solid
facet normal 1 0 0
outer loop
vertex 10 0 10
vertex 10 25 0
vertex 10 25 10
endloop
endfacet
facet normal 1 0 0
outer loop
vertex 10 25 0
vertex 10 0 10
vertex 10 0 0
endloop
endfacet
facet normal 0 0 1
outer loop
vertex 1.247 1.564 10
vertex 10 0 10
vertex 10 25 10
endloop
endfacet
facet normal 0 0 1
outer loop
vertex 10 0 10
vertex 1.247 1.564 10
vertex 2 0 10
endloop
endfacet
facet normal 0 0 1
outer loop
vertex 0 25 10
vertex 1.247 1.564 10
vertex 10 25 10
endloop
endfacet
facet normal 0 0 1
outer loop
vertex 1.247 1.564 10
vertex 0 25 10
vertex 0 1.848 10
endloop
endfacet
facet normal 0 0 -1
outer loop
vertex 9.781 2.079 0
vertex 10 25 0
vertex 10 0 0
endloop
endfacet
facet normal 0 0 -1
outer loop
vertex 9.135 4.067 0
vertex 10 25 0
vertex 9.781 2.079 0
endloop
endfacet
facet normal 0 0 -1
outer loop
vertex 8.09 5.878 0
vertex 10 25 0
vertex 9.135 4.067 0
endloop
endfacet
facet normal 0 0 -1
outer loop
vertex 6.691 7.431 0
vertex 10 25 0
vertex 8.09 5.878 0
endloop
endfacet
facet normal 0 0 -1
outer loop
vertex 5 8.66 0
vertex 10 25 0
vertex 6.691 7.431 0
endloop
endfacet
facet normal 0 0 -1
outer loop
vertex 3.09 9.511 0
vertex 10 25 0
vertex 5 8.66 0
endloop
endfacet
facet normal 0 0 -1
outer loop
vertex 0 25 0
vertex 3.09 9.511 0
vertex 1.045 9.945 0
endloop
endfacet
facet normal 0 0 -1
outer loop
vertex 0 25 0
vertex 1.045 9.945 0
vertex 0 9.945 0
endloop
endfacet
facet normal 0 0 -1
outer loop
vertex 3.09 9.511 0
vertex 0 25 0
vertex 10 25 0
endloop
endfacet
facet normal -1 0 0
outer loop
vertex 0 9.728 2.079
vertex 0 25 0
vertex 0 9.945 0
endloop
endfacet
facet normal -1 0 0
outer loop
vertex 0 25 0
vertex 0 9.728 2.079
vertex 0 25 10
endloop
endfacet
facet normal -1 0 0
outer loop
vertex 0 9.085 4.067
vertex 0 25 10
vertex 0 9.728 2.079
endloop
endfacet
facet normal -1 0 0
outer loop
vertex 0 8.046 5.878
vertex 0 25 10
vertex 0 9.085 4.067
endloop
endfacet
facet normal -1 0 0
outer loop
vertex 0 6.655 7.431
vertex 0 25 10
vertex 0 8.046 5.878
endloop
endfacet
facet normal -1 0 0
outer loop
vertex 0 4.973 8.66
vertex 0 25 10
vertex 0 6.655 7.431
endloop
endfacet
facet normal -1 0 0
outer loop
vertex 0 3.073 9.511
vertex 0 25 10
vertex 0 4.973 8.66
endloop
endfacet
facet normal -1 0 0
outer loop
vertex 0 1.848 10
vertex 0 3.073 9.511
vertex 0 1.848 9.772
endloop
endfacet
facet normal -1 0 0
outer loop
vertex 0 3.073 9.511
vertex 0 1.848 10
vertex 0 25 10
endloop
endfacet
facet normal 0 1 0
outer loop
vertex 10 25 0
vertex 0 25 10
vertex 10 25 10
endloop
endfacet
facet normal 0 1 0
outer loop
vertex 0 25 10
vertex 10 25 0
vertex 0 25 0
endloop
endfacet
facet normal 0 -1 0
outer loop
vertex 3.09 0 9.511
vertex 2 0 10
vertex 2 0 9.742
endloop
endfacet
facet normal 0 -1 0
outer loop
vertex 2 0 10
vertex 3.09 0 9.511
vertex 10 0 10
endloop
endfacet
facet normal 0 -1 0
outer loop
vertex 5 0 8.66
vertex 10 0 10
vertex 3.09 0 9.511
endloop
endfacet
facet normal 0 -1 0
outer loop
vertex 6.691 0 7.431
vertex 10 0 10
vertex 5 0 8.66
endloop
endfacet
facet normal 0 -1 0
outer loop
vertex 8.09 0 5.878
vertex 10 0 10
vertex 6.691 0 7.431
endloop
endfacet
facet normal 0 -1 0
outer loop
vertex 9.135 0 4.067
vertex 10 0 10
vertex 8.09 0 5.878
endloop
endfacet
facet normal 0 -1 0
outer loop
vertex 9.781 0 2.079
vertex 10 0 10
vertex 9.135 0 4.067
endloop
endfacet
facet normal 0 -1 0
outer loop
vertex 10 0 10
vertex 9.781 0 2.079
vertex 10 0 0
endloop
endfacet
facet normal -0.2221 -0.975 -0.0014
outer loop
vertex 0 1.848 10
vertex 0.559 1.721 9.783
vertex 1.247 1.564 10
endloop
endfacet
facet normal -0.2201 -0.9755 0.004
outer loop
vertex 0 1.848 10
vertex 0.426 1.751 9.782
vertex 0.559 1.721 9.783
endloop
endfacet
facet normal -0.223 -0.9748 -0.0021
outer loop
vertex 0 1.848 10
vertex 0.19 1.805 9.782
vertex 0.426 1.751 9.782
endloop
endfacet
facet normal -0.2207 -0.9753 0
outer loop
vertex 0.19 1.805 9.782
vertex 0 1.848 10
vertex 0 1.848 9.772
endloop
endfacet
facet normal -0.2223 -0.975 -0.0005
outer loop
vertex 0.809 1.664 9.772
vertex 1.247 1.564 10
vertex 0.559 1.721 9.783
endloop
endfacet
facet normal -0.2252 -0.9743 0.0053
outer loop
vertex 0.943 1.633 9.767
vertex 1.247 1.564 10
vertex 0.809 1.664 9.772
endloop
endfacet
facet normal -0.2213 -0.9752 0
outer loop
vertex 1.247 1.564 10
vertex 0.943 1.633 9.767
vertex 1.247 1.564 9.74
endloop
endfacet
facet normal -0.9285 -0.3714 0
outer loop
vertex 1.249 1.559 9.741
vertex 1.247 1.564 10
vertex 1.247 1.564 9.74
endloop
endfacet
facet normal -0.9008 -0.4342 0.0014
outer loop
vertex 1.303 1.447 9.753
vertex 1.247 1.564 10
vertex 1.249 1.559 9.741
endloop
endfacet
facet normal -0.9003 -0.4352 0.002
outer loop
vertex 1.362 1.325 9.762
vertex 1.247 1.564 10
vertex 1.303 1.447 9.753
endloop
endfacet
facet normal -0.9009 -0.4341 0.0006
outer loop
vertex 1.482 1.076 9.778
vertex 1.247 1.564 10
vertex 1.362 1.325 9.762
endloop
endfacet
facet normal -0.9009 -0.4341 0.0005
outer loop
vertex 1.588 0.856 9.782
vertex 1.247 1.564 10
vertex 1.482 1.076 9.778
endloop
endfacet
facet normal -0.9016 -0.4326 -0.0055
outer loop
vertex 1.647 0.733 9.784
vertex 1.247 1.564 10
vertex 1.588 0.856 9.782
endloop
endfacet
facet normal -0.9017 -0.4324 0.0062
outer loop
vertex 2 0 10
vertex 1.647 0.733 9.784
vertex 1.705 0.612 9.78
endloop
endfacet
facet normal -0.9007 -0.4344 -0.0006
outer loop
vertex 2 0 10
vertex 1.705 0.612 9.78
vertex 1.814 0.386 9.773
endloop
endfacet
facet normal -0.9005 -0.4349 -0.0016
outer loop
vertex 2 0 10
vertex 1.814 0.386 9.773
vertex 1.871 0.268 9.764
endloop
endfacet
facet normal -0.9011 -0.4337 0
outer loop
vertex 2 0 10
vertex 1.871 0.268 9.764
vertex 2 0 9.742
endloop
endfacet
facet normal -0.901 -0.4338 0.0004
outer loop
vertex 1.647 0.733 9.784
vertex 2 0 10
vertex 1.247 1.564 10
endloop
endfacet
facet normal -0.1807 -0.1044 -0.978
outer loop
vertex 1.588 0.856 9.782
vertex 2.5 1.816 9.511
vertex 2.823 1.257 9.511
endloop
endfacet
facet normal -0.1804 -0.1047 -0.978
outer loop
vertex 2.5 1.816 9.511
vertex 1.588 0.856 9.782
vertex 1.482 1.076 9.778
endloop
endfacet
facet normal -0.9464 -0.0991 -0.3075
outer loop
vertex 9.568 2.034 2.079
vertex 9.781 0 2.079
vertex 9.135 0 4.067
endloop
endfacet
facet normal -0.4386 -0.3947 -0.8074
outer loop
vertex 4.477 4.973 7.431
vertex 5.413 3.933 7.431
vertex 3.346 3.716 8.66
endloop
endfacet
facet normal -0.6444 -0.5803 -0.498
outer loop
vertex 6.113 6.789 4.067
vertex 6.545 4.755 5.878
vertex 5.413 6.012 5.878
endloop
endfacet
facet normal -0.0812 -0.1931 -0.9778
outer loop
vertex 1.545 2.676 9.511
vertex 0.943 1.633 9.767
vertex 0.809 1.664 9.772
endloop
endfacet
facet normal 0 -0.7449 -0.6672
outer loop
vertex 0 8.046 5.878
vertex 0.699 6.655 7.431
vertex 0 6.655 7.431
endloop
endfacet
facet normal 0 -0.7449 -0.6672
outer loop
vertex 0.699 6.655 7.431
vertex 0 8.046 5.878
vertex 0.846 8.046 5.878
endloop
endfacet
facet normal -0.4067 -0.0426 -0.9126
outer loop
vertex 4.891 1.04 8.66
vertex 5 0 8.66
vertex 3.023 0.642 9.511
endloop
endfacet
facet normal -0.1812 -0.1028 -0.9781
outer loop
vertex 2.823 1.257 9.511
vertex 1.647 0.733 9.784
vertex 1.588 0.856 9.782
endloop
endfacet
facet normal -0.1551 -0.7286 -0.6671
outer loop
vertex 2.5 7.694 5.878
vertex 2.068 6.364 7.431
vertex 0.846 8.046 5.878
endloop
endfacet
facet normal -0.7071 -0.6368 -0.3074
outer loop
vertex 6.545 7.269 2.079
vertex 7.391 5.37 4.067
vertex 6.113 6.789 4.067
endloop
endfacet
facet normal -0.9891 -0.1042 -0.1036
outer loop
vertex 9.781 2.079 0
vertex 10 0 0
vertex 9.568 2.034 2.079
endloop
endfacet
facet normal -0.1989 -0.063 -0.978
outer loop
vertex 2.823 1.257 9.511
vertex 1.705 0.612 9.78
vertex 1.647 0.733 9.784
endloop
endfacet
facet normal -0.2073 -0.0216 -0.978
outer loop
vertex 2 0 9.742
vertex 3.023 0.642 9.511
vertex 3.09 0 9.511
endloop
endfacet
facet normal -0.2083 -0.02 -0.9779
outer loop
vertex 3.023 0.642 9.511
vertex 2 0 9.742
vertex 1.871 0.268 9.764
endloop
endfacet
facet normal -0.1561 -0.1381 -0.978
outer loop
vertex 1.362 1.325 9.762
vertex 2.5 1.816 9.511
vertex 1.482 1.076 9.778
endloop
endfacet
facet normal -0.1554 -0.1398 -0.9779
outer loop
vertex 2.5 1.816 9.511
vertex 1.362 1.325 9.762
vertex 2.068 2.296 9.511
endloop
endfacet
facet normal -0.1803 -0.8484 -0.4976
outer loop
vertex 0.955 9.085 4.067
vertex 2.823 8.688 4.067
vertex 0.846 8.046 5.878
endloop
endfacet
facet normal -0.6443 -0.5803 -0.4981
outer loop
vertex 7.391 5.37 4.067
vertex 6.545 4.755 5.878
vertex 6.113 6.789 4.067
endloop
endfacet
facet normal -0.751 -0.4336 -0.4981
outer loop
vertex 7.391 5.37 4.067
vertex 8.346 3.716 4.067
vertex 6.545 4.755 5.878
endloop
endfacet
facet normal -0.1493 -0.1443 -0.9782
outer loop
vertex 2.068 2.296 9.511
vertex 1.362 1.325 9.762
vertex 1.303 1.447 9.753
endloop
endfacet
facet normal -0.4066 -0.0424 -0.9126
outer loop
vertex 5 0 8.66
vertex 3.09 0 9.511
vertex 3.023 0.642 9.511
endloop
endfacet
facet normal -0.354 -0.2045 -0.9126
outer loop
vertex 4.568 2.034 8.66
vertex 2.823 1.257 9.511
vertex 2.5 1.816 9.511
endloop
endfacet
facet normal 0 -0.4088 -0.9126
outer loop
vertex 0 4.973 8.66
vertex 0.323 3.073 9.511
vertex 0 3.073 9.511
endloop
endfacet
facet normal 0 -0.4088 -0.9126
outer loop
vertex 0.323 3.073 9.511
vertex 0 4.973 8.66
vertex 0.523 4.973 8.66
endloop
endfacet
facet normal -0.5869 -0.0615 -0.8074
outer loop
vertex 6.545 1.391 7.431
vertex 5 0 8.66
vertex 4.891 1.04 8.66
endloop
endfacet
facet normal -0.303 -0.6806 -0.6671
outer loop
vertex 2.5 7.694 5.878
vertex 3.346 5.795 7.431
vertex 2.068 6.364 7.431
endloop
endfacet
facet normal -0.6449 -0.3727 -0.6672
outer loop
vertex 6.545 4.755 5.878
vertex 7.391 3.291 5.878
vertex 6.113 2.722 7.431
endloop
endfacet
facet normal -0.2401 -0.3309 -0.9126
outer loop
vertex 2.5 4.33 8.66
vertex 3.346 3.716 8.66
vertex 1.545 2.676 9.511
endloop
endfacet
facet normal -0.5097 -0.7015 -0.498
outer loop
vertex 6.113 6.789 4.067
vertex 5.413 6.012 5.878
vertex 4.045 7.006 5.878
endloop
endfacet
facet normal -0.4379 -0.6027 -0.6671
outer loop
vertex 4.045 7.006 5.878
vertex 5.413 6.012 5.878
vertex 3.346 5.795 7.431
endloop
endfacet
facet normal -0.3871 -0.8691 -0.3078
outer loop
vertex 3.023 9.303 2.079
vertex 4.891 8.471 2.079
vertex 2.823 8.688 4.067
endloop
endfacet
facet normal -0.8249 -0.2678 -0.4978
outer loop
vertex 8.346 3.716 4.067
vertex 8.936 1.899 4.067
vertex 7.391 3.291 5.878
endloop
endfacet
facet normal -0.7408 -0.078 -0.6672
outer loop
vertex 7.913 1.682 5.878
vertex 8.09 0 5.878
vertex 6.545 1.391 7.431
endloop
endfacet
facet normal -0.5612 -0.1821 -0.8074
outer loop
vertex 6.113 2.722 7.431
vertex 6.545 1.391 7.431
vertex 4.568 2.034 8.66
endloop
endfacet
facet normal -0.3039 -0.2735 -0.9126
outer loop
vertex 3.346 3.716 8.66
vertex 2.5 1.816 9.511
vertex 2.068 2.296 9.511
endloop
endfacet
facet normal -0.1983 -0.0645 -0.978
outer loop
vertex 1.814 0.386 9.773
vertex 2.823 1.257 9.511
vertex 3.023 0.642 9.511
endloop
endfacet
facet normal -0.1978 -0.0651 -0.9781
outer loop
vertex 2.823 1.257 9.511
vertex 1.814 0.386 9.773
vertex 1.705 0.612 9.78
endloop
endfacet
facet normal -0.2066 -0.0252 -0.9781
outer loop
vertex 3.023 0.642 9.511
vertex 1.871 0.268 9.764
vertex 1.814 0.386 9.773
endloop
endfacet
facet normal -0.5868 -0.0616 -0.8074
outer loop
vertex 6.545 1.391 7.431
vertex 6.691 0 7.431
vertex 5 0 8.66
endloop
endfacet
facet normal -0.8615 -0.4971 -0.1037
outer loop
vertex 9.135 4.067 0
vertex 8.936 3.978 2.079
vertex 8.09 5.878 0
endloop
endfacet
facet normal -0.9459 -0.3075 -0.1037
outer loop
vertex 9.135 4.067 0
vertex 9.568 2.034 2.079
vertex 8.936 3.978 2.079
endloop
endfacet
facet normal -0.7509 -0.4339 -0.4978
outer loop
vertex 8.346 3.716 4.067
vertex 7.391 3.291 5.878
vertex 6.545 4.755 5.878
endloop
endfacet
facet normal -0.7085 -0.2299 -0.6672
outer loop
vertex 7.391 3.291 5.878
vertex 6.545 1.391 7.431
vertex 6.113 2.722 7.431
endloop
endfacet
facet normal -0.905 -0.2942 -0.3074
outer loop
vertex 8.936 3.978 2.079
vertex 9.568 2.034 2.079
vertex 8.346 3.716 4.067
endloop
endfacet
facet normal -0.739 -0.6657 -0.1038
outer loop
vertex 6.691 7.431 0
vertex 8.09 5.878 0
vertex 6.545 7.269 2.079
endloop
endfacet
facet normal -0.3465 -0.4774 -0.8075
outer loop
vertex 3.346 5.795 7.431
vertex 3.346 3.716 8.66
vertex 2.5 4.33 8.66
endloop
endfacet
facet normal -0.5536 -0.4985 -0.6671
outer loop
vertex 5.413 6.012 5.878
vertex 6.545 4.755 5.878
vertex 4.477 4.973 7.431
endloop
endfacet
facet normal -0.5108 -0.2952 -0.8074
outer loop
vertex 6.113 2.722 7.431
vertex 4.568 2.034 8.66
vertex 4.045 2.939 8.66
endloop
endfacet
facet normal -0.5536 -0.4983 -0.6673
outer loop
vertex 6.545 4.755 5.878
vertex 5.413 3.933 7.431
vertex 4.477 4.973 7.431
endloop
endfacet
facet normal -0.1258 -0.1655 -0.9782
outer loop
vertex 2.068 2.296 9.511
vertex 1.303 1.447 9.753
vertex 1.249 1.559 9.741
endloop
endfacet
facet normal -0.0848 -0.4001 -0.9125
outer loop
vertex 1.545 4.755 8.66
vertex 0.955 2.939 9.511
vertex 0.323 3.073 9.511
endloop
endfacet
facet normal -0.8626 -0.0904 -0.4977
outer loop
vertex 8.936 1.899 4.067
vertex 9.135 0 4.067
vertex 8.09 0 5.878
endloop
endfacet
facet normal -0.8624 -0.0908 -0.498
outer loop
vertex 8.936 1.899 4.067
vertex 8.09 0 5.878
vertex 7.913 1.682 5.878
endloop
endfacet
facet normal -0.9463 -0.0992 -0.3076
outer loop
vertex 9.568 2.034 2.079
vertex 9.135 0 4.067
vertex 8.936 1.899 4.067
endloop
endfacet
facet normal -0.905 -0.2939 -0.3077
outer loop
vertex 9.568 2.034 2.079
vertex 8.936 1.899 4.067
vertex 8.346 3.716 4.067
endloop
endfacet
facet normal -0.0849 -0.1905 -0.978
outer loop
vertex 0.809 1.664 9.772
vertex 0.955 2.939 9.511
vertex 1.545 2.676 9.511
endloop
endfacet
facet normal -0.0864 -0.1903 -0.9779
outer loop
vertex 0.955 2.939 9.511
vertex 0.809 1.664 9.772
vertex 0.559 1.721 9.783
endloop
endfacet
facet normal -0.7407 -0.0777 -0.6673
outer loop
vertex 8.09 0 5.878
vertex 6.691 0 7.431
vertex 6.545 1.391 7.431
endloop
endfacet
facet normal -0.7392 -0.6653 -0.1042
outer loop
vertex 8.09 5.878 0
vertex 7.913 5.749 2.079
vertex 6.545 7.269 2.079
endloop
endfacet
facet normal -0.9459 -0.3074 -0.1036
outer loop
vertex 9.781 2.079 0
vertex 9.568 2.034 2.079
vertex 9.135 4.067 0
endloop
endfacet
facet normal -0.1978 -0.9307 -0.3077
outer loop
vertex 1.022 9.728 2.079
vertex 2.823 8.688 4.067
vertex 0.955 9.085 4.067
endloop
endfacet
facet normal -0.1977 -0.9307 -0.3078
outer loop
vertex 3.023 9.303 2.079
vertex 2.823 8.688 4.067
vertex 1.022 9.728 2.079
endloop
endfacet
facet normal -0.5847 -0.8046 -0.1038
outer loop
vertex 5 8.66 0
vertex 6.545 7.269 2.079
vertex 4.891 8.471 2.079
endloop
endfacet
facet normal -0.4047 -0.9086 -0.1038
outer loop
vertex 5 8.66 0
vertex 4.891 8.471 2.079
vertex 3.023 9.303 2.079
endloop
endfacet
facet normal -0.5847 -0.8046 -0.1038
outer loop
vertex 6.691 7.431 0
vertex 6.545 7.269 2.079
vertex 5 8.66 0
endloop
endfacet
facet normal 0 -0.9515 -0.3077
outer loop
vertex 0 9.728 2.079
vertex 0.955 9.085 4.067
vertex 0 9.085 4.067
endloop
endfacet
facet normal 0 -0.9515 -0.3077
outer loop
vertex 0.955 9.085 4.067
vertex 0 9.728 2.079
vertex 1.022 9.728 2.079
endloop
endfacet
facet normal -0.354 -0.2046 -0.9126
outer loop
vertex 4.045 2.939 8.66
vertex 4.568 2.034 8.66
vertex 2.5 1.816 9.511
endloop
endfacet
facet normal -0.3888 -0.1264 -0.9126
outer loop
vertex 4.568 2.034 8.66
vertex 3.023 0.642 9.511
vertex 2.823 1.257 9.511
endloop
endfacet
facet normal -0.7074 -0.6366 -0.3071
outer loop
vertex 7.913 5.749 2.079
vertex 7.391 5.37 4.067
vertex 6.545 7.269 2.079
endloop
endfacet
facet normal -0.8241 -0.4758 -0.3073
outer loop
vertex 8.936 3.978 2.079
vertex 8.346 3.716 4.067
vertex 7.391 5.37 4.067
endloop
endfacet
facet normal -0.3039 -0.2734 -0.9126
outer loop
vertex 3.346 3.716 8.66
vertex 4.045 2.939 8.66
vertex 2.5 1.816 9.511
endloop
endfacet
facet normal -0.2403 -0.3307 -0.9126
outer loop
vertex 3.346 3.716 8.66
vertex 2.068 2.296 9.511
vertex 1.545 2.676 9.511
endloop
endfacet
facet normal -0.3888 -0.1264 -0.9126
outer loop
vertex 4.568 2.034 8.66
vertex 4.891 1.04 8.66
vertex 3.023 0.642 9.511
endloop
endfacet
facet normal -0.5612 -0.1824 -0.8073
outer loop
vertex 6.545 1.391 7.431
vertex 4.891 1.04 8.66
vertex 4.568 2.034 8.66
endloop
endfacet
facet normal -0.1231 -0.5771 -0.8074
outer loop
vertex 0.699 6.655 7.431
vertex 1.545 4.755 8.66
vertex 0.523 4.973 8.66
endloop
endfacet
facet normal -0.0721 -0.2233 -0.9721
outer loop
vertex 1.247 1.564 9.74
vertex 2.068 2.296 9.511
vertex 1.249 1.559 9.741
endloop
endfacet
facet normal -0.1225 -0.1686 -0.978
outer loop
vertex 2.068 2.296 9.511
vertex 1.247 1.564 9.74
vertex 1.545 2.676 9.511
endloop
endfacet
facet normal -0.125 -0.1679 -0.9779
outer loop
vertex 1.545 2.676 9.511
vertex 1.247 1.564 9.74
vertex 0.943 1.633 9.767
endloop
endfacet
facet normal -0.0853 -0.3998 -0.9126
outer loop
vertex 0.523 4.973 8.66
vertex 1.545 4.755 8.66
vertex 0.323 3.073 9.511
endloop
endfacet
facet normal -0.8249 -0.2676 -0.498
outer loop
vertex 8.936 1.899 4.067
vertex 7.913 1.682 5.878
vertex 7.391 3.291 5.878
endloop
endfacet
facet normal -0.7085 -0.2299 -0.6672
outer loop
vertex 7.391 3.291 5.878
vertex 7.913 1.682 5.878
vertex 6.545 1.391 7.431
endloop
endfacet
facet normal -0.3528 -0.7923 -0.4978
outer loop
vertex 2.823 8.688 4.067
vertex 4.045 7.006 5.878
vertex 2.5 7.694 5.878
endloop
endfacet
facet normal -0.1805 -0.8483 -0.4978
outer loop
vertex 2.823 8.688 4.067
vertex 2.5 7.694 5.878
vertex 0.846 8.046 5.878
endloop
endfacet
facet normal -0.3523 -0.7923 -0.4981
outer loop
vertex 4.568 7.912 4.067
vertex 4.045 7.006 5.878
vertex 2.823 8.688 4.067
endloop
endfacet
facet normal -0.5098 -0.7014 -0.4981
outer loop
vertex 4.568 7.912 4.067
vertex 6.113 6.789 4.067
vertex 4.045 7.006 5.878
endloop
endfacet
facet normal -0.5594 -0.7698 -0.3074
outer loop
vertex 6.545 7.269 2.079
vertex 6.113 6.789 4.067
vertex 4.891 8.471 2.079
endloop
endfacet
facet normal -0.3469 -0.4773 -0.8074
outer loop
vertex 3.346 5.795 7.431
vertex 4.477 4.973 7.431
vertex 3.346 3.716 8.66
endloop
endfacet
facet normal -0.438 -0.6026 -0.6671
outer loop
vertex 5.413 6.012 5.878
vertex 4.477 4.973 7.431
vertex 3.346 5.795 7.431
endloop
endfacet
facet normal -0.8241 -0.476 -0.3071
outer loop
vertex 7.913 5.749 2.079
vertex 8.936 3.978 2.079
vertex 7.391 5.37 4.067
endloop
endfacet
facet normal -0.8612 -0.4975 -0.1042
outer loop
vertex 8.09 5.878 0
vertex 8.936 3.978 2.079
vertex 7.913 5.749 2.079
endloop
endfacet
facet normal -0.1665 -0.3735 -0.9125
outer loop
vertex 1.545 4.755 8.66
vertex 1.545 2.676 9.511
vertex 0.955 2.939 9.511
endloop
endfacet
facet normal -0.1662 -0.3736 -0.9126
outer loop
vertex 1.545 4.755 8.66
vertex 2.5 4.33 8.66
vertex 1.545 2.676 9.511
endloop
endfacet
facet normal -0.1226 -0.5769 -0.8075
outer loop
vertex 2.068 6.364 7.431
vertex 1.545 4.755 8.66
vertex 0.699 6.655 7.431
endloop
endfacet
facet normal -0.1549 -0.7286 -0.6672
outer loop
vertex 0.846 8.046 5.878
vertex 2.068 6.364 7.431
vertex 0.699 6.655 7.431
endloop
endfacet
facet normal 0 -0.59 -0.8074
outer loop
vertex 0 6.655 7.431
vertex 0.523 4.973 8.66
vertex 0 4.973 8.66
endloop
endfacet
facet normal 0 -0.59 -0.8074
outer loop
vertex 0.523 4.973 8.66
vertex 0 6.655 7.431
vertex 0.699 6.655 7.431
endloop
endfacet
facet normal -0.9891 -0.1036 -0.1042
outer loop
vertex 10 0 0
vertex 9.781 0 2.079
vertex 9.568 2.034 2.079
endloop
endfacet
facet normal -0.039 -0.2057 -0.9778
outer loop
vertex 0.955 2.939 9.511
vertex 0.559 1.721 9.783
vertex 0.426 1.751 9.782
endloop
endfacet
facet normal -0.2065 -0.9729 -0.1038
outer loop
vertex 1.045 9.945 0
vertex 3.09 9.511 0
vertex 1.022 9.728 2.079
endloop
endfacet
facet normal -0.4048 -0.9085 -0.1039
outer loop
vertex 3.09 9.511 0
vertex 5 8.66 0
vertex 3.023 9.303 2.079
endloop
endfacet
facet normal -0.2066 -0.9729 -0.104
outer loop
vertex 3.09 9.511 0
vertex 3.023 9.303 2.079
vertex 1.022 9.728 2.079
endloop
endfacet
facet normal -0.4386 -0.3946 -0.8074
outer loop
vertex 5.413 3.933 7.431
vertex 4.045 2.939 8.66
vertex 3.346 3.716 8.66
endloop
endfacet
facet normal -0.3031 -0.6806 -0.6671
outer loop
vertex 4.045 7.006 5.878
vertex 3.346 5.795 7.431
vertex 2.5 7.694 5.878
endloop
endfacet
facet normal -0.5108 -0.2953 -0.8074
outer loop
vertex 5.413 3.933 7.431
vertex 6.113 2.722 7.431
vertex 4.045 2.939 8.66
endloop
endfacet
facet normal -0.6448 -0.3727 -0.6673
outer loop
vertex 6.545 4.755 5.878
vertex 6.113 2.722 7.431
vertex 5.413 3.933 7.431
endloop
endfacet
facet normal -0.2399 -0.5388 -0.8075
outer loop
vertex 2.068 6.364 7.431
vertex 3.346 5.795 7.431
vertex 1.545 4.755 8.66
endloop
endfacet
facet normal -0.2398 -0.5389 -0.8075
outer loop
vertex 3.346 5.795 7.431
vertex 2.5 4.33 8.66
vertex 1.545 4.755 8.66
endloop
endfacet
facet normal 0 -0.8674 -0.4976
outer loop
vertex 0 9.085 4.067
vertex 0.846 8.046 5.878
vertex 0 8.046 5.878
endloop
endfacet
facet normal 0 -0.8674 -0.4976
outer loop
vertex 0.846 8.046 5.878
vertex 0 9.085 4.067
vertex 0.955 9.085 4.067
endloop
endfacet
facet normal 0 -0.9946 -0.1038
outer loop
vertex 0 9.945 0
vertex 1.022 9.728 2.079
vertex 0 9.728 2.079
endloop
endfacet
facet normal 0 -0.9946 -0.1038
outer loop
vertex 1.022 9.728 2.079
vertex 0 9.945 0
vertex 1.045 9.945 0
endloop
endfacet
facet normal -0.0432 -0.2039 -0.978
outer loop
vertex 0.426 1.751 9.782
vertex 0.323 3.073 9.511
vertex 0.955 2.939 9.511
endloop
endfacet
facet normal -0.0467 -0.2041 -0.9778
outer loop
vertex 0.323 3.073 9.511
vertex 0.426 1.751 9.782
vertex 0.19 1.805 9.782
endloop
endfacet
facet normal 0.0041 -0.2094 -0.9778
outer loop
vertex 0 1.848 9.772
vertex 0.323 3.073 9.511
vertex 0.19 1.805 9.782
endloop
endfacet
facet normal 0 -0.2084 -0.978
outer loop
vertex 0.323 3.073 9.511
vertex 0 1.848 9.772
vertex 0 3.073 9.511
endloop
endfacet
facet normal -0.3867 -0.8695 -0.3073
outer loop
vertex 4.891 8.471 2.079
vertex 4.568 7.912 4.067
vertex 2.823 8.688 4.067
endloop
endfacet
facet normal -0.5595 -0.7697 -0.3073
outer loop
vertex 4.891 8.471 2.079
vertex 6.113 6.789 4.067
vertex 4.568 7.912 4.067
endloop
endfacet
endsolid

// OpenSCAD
// Generated by generate_scads.py
difference() {
  difference() {
    cube(size=[10,25,10], center=false);
    cylinder(h=10, r=2, center=false);
  }
  sphere(r=10);
}
